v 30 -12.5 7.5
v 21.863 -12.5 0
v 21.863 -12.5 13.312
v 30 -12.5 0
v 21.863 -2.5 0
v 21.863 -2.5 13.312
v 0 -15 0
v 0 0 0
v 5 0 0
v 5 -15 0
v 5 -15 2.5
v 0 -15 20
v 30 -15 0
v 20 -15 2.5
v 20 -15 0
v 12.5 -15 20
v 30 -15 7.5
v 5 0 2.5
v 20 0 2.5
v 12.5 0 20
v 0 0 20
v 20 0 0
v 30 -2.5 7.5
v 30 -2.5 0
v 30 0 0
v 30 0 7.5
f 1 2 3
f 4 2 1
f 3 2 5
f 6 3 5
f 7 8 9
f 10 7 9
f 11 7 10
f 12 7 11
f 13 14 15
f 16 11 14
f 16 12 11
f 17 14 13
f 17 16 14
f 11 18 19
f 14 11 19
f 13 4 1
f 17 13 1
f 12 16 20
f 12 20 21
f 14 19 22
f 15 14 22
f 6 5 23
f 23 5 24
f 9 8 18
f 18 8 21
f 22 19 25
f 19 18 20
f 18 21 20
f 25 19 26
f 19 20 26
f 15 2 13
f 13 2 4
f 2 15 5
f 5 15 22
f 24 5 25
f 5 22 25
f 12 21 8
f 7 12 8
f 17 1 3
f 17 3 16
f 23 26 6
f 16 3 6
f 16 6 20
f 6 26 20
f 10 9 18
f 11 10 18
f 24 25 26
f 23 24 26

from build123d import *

# Parameters (mm, degrees)
F1_DEPTH = 15
F2_W     = 8.1373347121
F2_H     = 10
F3_DEPTH = 25


with BuildPart() as f1:
    # F0 (on Front) → F1 (new body)
    with BuildSketch(Plane.XZ):
        Polygon((0, 20), (0, 0), (5, 0), (5, 2.5), (20, 2.5), (20, 0), (30, 0), (30, 7.5), (12.5, 20), align=None)
    extrude(amount=F1_DEPTH)

    # F2 (on Top) → F3 (cut)
    with BuildSketch(Plane.XY):
        with Locations((25.931332644, -7.5)):
            Rectangle(F2_W, F2_H)
    extrude(amount=F3_DEPTH, mode=Mode.SUBTRACT)


solid = f1.part
